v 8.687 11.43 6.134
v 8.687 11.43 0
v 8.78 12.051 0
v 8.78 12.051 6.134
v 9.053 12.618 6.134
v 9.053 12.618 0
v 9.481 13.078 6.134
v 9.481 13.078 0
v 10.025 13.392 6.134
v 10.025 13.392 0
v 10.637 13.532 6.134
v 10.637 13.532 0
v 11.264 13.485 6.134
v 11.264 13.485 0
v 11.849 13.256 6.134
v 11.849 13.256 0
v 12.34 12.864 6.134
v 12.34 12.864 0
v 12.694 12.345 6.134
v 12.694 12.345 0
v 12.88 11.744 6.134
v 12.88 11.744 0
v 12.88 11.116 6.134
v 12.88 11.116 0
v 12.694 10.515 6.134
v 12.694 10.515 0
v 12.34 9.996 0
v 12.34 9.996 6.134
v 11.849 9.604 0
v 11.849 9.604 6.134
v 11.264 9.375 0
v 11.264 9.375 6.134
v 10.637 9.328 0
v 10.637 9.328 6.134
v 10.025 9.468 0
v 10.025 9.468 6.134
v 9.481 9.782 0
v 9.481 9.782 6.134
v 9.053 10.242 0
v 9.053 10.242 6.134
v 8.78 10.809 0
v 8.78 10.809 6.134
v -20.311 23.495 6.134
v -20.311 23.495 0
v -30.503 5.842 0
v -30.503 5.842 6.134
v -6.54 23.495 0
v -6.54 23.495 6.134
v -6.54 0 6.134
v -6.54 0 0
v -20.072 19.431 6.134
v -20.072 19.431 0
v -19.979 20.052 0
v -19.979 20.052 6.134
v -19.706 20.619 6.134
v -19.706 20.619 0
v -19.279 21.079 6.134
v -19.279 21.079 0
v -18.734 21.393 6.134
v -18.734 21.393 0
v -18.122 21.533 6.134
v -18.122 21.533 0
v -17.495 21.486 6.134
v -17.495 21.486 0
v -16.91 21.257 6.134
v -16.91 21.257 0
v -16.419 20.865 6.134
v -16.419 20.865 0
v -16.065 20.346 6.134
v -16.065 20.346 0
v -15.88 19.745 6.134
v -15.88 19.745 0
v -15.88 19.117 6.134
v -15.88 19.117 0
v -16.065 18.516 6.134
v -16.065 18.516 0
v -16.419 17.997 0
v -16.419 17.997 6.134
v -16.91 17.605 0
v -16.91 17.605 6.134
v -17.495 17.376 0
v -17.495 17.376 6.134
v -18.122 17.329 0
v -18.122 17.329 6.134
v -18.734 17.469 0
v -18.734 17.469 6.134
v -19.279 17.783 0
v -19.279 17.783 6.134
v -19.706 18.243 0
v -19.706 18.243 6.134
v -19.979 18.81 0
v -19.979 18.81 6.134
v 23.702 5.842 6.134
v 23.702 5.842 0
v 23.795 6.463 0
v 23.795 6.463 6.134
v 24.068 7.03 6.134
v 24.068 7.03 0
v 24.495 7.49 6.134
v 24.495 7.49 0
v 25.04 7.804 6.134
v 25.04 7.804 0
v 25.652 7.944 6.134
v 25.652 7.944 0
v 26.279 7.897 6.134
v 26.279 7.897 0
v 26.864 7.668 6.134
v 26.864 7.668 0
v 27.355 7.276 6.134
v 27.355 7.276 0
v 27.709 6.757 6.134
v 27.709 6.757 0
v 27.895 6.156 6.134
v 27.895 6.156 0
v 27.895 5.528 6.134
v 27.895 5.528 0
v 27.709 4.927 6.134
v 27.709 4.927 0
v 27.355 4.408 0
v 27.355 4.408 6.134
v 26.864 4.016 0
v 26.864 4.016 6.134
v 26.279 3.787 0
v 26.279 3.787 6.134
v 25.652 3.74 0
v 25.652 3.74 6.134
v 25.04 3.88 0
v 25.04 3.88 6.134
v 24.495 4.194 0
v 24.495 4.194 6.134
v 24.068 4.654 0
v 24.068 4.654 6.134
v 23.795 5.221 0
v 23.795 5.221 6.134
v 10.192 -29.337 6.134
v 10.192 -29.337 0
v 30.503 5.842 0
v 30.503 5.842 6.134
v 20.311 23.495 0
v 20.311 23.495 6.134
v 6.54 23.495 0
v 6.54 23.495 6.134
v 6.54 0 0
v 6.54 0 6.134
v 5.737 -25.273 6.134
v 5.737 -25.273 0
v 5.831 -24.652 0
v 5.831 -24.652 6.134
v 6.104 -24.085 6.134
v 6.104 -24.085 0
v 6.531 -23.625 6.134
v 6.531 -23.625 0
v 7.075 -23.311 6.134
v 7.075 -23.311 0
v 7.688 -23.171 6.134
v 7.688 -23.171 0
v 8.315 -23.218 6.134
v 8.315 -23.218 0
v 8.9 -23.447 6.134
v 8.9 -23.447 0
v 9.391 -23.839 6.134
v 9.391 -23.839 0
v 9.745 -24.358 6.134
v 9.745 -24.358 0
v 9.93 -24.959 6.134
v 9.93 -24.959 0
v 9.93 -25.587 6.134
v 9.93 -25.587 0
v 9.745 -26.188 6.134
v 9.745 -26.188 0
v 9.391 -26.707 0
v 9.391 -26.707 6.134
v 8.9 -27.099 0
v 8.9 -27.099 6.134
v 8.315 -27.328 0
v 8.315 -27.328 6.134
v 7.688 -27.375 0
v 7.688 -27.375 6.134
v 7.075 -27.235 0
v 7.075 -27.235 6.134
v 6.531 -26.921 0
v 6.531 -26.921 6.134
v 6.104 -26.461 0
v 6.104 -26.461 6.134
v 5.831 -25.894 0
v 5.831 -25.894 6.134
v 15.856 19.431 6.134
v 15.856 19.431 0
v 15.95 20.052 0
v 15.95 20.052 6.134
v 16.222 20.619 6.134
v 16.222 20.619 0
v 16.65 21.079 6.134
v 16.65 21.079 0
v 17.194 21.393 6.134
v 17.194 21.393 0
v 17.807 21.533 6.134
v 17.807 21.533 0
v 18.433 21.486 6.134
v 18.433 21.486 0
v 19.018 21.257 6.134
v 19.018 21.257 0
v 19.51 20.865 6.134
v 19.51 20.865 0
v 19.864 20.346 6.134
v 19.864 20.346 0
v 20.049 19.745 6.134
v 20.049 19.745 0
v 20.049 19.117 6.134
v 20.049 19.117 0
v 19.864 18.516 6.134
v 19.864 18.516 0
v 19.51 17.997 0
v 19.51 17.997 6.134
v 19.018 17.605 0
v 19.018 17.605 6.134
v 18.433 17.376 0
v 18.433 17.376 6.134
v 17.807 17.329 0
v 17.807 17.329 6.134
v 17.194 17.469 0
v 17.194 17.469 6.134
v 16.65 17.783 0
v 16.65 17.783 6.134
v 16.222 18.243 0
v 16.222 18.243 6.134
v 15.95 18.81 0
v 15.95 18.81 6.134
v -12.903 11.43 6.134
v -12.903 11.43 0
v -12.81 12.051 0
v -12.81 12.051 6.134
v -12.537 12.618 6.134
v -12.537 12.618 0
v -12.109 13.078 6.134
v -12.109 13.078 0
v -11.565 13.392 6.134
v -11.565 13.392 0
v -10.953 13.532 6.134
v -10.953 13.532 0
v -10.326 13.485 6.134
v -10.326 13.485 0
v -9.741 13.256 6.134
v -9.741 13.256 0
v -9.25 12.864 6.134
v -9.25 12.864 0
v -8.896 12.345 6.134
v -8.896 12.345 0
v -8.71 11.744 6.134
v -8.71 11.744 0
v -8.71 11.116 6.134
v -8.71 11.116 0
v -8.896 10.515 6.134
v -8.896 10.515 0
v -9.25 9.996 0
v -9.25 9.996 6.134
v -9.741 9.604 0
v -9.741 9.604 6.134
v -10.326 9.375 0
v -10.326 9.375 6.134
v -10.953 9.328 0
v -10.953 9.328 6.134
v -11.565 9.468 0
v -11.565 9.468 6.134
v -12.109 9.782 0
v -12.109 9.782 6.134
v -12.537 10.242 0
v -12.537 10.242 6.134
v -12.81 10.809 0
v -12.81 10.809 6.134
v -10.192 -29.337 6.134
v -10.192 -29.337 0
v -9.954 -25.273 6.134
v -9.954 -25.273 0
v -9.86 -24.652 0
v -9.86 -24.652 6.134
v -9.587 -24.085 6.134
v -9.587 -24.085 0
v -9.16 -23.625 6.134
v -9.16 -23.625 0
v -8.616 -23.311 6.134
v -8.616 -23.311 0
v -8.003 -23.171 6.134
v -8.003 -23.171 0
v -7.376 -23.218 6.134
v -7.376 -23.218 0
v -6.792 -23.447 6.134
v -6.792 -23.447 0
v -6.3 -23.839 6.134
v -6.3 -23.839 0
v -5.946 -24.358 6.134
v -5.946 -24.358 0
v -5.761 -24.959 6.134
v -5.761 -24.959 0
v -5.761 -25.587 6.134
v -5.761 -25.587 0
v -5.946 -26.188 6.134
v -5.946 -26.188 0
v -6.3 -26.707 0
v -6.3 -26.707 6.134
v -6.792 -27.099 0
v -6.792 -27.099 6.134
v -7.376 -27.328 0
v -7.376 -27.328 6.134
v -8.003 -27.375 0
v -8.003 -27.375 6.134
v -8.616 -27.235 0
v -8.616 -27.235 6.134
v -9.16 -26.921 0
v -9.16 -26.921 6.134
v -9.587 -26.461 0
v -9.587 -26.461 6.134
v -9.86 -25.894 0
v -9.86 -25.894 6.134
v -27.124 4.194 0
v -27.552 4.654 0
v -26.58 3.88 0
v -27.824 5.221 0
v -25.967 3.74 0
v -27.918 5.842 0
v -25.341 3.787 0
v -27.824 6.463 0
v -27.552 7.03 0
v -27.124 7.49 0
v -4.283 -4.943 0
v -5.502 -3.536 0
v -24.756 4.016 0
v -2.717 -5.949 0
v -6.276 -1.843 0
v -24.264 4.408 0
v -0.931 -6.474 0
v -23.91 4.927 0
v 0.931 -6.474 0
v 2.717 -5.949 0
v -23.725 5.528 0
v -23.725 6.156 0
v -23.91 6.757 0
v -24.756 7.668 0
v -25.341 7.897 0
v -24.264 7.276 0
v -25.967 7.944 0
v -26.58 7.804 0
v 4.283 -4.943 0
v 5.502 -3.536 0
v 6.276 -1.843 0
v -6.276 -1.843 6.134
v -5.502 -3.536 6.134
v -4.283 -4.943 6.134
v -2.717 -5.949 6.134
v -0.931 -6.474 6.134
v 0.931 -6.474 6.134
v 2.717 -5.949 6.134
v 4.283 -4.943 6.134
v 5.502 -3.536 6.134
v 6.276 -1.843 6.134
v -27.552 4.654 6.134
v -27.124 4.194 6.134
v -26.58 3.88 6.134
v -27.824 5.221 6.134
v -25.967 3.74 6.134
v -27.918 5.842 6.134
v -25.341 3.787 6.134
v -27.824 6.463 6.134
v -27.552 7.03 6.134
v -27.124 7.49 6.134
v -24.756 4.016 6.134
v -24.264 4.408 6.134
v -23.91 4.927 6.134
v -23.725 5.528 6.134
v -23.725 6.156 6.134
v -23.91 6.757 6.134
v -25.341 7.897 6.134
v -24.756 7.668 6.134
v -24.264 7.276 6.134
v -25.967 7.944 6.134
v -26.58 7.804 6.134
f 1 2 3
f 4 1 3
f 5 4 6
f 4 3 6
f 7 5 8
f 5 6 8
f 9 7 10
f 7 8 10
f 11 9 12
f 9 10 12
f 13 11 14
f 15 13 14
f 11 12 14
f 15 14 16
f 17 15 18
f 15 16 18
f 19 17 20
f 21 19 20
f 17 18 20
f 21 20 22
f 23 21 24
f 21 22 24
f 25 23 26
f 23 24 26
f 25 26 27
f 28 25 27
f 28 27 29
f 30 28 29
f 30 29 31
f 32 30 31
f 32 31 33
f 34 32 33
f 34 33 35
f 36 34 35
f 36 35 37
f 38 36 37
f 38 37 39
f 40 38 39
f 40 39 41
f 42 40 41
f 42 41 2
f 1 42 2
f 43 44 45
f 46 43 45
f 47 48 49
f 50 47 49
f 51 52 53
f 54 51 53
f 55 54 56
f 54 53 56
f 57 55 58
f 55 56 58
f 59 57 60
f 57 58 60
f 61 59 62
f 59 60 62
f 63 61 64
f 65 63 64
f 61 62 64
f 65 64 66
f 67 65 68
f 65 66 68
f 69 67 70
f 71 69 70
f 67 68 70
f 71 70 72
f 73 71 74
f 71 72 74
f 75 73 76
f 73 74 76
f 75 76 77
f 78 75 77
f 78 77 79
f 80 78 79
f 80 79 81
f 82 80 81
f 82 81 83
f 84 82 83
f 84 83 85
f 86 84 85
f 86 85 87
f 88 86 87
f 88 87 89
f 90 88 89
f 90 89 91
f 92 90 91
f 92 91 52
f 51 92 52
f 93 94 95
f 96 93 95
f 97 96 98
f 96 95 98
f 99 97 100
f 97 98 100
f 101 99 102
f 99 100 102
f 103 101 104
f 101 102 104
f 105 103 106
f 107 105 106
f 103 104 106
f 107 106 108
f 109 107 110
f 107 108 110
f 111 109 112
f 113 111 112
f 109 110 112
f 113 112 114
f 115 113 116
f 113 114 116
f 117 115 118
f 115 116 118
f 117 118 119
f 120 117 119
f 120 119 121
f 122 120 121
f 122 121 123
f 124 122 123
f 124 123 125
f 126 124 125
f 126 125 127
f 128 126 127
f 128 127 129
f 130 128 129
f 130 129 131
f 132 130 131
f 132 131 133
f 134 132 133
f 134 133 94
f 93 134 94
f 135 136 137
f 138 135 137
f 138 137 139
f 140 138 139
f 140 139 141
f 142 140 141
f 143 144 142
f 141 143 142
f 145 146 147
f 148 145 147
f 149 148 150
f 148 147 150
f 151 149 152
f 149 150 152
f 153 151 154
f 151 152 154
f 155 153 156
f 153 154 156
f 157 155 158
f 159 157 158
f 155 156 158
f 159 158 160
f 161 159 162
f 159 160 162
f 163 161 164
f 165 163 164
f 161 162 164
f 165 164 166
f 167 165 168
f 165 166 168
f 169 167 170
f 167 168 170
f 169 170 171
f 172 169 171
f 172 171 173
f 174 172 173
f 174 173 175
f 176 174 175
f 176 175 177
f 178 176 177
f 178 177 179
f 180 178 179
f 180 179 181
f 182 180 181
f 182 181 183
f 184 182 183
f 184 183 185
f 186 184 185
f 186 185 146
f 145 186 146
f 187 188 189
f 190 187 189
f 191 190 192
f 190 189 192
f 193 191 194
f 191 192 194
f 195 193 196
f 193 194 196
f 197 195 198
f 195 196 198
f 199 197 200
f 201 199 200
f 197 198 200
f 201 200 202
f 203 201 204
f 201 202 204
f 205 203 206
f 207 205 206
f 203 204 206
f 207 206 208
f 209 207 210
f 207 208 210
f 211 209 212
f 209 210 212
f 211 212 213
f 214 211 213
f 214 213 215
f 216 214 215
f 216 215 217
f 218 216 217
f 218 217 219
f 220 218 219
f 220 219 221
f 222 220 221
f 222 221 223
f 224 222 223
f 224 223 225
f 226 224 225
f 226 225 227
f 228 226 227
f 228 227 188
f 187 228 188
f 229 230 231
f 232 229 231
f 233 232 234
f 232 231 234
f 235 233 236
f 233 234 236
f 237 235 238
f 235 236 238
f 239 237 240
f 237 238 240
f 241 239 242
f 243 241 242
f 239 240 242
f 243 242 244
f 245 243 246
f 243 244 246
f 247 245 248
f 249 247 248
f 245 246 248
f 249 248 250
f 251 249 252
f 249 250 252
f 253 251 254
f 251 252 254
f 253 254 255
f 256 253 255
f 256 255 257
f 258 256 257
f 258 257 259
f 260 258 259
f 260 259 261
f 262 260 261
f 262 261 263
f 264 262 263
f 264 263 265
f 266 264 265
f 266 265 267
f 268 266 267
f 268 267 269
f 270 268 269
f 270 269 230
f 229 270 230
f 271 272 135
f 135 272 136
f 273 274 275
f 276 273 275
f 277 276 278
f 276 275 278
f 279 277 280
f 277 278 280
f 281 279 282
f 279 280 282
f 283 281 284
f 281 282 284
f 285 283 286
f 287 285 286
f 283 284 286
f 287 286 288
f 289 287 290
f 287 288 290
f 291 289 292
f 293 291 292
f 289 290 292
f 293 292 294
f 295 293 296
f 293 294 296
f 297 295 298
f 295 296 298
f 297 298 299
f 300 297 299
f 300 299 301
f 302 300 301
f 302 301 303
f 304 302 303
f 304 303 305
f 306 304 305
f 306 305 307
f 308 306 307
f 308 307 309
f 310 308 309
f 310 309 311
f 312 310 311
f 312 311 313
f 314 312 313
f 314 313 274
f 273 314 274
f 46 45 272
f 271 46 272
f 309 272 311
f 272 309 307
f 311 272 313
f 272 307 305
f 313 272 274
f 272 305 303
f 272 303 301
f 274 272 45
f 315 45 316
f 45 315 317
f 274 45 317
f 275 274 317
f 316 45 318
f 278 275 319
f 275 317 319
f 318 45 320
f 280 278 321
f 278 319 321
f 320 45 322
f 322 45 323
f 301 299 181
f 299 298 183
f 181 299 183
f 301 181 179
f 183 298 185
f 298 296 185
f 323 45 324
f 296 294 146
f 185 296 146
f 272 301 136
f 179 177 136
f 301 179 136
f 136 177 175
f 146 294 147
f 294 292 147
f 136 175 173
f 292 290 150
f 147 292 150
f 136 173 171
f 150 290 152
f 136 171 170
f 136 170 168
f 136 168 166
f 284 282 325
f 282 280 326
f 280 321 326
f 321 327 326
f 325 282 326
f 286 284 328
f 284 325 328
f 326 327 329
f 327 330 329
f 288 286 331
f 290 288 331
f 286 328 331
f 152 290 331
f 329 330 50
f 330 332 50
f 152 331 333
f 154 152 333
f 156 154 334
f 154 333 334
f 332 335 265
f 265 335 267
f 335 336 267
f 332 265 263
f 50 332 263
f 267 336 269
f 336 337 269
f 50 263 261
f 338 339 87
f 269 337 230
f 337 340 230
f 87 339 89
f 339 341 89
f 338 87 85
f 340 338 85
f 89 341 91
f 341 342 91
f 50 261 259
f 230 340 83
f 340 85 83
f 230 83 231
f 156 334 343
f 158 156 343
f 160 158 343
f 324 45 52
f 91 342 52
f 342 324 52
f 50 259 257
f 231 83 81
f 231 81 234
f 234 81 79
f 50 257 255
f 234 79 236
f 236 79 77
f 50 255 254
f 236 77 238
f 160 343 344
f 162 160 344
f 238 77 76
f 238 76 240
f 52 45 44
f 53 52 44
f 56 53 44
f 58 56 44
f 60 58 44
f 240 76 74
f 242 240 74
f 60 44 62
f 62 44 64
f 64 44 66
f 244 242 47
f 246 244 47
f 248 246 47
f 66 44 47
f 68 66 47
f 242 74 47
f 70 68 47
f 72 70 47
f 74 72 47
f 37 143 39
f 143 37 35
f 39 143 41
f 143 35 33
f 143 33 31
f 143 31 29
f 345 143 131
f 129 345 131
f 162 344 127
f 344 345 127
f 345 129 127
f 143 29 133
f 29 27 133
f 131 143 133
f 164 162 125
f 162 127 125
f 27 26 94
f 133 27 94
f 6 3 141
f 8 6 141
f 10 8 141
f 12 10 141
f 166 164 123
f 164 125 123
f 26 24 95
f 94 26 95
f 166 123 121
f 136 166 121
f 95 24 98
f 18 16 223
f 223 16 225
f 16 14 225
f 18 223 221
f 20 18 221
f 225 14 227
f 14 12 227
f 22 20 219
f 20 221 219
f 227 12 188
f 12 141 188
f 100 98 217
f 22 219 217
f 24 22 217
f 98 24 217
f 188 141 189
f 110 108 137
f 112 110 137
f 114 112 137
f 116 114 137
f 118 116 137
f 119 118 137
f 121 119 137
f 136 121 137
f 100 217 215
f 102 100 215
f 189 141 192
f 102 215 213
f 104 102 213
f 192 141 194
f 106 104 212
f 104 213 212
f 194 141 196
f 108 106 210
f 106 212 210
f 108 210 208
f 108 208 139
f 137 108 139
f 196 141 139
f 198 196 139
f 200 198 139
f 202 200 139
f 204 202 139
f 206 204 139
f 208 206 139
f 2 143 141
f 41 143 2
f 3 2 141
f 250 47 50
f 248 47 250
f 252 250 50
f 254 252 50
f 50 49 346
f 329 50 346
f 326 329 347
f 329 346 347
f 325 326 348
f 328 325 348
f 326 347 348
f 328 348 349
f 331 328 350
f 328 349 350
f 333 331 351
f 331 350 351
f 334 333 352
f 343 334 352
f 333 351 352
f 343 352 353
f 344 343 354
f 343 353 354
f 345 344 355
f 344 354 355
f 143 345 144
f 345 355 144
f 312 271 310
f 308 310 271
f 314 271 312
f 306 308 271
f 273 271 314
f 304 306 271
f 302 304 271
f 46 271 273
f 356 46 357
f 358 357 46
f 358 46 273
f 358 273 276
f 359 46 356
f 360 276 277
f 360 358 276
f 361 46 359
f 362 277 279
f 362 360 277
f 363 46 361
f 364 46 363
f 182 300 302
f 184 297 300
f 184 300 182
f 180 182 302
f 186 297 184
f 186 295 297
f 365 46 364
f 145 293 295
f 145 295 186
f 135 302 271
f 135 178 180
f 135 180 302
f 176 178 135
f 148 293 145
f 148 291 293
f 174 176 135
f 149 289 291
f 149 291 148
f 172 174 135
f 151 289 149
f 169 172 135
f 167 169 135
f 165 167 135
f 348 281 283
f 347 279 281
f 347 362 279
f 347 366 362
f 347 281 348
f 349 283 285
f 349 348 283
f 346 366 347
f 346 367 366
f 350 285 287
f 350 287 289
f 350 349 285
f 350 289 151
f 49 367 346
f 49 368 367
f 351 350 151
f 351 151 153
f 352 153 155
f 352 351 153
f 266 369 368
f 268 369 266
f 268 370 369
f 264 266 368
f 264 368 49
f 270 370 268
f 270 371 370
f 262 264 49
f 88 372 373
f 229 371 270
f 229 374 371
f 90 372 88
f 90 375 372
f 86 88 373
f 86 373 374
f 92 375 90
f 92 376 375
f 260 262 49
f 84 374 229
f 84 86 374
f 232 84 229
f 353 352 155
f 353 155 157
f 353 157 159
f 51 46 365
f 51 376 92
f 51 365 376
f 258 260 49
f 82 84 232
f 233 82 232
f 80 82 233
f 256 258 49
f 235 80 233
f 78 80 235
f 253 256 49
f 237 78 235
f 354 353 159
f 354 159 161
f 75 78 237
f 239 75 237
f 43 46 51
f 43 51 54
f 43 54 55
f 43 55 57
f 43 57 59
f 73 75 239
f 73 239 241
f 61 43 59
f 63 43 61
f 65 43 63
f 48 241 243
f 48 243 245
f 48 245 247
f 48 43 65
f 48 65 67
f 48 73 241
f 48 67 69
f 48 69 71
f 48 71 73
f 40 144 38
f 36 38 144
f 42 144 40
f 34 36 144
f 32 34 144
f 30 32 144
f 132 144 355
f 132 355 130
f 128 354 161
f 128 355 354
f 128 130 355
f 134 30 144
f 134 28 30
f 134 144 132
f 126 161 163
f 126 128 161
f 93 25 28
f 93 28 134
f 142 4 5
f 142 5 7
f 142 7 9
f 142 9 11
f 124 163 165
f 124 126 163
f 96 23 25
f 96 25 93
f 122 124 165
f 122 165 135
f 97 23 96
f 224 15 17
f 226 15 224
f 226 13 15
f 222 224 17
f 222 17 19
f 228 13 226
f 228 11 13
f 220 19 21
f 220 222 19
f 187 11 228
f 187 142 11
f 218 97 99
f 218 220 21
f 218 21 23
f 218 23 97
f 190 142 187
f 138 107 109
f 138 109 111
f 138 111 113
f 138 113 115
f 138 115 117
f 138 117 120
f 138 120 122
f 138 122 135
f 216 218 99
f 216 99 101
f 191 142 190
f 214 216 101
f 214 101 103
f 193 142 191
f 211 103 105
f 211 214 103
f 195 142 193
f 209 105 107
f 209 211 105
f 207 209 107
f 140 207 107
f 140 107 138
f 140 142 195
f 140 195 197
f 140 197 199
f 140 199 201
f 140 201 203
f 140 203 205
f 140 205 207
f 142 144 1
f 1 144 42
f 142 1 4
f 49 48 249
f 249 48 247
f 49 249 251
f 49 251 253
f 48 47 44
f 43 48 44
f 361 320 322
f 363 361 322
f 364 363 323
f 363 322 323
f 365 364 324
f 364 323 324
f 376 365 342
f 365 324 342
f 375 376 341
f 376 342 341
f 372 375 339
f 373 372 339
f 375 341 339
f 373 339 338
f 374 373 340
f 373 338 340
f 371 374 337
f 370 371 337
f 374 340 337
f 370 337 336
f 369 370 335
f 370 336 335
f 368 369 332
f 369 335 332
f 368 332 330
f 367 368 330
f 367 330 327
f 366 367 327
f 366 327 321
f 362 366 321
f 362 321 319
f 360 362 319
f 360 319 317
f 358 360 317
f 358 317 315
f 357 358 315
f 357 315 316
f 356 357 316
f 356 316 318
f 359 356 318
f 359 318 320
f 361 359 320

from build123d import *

# Parameters (mm, degrees)
F1_DEPTH = 6.1341
F3_D     = 4.2164
F5_DEPTH = 6.1341
F7_D     = 4.2164


with BuildPart() as f1:
    # F0 (on Top) → F1 (new body)
    with BuildSketch(Plane.XY):
        Polygon((-30.502569, 5.842), (-10.191964, -29.337), (10.191964, -29.337), (30.502569, 5.842), (20.310605, 23.495), (-20.310605, 23.495), align=None)
    extrude(amount=F1_DEPTH)

    # F3 (through all)
    with Locations(Plane.XY.offset(6.1341)):
        with Locations((-17.964254, 19.431), (-25.809866, 5.842), (-7.845613, -25.273), (7.845613, -25.273), (25.809866, 5.842), (17.964254, 19.431)):
            Hole(F3_D / 2)

    # F4 (on face) → F5 (cut, through all)
    with BuildSketch(Plane.XY.offset(6.1341)):
        with BuildLine():
            Line((-6.5405, 23.495), (-6.5405, 0))
            ThreePointArc((-6.5405, 0), (0, -6.5405), (6.5405, 0))
            Line((6.5405, 0), (6.5405, 23.495))
            Line((6.5405, 23.495), (-6.5405, 23.495))
        make_face()
    extrude(amount=-F5_DEPTH, mode=Mode.SUBTRACT)

    # F7 (through all)
    with Locations(Plane.XY.offset(6.1341)):
        with Locations((-10.795, 11.43), (10.795, 11.43)):
            Hole(F7_D / 2)


solid = f1.part
